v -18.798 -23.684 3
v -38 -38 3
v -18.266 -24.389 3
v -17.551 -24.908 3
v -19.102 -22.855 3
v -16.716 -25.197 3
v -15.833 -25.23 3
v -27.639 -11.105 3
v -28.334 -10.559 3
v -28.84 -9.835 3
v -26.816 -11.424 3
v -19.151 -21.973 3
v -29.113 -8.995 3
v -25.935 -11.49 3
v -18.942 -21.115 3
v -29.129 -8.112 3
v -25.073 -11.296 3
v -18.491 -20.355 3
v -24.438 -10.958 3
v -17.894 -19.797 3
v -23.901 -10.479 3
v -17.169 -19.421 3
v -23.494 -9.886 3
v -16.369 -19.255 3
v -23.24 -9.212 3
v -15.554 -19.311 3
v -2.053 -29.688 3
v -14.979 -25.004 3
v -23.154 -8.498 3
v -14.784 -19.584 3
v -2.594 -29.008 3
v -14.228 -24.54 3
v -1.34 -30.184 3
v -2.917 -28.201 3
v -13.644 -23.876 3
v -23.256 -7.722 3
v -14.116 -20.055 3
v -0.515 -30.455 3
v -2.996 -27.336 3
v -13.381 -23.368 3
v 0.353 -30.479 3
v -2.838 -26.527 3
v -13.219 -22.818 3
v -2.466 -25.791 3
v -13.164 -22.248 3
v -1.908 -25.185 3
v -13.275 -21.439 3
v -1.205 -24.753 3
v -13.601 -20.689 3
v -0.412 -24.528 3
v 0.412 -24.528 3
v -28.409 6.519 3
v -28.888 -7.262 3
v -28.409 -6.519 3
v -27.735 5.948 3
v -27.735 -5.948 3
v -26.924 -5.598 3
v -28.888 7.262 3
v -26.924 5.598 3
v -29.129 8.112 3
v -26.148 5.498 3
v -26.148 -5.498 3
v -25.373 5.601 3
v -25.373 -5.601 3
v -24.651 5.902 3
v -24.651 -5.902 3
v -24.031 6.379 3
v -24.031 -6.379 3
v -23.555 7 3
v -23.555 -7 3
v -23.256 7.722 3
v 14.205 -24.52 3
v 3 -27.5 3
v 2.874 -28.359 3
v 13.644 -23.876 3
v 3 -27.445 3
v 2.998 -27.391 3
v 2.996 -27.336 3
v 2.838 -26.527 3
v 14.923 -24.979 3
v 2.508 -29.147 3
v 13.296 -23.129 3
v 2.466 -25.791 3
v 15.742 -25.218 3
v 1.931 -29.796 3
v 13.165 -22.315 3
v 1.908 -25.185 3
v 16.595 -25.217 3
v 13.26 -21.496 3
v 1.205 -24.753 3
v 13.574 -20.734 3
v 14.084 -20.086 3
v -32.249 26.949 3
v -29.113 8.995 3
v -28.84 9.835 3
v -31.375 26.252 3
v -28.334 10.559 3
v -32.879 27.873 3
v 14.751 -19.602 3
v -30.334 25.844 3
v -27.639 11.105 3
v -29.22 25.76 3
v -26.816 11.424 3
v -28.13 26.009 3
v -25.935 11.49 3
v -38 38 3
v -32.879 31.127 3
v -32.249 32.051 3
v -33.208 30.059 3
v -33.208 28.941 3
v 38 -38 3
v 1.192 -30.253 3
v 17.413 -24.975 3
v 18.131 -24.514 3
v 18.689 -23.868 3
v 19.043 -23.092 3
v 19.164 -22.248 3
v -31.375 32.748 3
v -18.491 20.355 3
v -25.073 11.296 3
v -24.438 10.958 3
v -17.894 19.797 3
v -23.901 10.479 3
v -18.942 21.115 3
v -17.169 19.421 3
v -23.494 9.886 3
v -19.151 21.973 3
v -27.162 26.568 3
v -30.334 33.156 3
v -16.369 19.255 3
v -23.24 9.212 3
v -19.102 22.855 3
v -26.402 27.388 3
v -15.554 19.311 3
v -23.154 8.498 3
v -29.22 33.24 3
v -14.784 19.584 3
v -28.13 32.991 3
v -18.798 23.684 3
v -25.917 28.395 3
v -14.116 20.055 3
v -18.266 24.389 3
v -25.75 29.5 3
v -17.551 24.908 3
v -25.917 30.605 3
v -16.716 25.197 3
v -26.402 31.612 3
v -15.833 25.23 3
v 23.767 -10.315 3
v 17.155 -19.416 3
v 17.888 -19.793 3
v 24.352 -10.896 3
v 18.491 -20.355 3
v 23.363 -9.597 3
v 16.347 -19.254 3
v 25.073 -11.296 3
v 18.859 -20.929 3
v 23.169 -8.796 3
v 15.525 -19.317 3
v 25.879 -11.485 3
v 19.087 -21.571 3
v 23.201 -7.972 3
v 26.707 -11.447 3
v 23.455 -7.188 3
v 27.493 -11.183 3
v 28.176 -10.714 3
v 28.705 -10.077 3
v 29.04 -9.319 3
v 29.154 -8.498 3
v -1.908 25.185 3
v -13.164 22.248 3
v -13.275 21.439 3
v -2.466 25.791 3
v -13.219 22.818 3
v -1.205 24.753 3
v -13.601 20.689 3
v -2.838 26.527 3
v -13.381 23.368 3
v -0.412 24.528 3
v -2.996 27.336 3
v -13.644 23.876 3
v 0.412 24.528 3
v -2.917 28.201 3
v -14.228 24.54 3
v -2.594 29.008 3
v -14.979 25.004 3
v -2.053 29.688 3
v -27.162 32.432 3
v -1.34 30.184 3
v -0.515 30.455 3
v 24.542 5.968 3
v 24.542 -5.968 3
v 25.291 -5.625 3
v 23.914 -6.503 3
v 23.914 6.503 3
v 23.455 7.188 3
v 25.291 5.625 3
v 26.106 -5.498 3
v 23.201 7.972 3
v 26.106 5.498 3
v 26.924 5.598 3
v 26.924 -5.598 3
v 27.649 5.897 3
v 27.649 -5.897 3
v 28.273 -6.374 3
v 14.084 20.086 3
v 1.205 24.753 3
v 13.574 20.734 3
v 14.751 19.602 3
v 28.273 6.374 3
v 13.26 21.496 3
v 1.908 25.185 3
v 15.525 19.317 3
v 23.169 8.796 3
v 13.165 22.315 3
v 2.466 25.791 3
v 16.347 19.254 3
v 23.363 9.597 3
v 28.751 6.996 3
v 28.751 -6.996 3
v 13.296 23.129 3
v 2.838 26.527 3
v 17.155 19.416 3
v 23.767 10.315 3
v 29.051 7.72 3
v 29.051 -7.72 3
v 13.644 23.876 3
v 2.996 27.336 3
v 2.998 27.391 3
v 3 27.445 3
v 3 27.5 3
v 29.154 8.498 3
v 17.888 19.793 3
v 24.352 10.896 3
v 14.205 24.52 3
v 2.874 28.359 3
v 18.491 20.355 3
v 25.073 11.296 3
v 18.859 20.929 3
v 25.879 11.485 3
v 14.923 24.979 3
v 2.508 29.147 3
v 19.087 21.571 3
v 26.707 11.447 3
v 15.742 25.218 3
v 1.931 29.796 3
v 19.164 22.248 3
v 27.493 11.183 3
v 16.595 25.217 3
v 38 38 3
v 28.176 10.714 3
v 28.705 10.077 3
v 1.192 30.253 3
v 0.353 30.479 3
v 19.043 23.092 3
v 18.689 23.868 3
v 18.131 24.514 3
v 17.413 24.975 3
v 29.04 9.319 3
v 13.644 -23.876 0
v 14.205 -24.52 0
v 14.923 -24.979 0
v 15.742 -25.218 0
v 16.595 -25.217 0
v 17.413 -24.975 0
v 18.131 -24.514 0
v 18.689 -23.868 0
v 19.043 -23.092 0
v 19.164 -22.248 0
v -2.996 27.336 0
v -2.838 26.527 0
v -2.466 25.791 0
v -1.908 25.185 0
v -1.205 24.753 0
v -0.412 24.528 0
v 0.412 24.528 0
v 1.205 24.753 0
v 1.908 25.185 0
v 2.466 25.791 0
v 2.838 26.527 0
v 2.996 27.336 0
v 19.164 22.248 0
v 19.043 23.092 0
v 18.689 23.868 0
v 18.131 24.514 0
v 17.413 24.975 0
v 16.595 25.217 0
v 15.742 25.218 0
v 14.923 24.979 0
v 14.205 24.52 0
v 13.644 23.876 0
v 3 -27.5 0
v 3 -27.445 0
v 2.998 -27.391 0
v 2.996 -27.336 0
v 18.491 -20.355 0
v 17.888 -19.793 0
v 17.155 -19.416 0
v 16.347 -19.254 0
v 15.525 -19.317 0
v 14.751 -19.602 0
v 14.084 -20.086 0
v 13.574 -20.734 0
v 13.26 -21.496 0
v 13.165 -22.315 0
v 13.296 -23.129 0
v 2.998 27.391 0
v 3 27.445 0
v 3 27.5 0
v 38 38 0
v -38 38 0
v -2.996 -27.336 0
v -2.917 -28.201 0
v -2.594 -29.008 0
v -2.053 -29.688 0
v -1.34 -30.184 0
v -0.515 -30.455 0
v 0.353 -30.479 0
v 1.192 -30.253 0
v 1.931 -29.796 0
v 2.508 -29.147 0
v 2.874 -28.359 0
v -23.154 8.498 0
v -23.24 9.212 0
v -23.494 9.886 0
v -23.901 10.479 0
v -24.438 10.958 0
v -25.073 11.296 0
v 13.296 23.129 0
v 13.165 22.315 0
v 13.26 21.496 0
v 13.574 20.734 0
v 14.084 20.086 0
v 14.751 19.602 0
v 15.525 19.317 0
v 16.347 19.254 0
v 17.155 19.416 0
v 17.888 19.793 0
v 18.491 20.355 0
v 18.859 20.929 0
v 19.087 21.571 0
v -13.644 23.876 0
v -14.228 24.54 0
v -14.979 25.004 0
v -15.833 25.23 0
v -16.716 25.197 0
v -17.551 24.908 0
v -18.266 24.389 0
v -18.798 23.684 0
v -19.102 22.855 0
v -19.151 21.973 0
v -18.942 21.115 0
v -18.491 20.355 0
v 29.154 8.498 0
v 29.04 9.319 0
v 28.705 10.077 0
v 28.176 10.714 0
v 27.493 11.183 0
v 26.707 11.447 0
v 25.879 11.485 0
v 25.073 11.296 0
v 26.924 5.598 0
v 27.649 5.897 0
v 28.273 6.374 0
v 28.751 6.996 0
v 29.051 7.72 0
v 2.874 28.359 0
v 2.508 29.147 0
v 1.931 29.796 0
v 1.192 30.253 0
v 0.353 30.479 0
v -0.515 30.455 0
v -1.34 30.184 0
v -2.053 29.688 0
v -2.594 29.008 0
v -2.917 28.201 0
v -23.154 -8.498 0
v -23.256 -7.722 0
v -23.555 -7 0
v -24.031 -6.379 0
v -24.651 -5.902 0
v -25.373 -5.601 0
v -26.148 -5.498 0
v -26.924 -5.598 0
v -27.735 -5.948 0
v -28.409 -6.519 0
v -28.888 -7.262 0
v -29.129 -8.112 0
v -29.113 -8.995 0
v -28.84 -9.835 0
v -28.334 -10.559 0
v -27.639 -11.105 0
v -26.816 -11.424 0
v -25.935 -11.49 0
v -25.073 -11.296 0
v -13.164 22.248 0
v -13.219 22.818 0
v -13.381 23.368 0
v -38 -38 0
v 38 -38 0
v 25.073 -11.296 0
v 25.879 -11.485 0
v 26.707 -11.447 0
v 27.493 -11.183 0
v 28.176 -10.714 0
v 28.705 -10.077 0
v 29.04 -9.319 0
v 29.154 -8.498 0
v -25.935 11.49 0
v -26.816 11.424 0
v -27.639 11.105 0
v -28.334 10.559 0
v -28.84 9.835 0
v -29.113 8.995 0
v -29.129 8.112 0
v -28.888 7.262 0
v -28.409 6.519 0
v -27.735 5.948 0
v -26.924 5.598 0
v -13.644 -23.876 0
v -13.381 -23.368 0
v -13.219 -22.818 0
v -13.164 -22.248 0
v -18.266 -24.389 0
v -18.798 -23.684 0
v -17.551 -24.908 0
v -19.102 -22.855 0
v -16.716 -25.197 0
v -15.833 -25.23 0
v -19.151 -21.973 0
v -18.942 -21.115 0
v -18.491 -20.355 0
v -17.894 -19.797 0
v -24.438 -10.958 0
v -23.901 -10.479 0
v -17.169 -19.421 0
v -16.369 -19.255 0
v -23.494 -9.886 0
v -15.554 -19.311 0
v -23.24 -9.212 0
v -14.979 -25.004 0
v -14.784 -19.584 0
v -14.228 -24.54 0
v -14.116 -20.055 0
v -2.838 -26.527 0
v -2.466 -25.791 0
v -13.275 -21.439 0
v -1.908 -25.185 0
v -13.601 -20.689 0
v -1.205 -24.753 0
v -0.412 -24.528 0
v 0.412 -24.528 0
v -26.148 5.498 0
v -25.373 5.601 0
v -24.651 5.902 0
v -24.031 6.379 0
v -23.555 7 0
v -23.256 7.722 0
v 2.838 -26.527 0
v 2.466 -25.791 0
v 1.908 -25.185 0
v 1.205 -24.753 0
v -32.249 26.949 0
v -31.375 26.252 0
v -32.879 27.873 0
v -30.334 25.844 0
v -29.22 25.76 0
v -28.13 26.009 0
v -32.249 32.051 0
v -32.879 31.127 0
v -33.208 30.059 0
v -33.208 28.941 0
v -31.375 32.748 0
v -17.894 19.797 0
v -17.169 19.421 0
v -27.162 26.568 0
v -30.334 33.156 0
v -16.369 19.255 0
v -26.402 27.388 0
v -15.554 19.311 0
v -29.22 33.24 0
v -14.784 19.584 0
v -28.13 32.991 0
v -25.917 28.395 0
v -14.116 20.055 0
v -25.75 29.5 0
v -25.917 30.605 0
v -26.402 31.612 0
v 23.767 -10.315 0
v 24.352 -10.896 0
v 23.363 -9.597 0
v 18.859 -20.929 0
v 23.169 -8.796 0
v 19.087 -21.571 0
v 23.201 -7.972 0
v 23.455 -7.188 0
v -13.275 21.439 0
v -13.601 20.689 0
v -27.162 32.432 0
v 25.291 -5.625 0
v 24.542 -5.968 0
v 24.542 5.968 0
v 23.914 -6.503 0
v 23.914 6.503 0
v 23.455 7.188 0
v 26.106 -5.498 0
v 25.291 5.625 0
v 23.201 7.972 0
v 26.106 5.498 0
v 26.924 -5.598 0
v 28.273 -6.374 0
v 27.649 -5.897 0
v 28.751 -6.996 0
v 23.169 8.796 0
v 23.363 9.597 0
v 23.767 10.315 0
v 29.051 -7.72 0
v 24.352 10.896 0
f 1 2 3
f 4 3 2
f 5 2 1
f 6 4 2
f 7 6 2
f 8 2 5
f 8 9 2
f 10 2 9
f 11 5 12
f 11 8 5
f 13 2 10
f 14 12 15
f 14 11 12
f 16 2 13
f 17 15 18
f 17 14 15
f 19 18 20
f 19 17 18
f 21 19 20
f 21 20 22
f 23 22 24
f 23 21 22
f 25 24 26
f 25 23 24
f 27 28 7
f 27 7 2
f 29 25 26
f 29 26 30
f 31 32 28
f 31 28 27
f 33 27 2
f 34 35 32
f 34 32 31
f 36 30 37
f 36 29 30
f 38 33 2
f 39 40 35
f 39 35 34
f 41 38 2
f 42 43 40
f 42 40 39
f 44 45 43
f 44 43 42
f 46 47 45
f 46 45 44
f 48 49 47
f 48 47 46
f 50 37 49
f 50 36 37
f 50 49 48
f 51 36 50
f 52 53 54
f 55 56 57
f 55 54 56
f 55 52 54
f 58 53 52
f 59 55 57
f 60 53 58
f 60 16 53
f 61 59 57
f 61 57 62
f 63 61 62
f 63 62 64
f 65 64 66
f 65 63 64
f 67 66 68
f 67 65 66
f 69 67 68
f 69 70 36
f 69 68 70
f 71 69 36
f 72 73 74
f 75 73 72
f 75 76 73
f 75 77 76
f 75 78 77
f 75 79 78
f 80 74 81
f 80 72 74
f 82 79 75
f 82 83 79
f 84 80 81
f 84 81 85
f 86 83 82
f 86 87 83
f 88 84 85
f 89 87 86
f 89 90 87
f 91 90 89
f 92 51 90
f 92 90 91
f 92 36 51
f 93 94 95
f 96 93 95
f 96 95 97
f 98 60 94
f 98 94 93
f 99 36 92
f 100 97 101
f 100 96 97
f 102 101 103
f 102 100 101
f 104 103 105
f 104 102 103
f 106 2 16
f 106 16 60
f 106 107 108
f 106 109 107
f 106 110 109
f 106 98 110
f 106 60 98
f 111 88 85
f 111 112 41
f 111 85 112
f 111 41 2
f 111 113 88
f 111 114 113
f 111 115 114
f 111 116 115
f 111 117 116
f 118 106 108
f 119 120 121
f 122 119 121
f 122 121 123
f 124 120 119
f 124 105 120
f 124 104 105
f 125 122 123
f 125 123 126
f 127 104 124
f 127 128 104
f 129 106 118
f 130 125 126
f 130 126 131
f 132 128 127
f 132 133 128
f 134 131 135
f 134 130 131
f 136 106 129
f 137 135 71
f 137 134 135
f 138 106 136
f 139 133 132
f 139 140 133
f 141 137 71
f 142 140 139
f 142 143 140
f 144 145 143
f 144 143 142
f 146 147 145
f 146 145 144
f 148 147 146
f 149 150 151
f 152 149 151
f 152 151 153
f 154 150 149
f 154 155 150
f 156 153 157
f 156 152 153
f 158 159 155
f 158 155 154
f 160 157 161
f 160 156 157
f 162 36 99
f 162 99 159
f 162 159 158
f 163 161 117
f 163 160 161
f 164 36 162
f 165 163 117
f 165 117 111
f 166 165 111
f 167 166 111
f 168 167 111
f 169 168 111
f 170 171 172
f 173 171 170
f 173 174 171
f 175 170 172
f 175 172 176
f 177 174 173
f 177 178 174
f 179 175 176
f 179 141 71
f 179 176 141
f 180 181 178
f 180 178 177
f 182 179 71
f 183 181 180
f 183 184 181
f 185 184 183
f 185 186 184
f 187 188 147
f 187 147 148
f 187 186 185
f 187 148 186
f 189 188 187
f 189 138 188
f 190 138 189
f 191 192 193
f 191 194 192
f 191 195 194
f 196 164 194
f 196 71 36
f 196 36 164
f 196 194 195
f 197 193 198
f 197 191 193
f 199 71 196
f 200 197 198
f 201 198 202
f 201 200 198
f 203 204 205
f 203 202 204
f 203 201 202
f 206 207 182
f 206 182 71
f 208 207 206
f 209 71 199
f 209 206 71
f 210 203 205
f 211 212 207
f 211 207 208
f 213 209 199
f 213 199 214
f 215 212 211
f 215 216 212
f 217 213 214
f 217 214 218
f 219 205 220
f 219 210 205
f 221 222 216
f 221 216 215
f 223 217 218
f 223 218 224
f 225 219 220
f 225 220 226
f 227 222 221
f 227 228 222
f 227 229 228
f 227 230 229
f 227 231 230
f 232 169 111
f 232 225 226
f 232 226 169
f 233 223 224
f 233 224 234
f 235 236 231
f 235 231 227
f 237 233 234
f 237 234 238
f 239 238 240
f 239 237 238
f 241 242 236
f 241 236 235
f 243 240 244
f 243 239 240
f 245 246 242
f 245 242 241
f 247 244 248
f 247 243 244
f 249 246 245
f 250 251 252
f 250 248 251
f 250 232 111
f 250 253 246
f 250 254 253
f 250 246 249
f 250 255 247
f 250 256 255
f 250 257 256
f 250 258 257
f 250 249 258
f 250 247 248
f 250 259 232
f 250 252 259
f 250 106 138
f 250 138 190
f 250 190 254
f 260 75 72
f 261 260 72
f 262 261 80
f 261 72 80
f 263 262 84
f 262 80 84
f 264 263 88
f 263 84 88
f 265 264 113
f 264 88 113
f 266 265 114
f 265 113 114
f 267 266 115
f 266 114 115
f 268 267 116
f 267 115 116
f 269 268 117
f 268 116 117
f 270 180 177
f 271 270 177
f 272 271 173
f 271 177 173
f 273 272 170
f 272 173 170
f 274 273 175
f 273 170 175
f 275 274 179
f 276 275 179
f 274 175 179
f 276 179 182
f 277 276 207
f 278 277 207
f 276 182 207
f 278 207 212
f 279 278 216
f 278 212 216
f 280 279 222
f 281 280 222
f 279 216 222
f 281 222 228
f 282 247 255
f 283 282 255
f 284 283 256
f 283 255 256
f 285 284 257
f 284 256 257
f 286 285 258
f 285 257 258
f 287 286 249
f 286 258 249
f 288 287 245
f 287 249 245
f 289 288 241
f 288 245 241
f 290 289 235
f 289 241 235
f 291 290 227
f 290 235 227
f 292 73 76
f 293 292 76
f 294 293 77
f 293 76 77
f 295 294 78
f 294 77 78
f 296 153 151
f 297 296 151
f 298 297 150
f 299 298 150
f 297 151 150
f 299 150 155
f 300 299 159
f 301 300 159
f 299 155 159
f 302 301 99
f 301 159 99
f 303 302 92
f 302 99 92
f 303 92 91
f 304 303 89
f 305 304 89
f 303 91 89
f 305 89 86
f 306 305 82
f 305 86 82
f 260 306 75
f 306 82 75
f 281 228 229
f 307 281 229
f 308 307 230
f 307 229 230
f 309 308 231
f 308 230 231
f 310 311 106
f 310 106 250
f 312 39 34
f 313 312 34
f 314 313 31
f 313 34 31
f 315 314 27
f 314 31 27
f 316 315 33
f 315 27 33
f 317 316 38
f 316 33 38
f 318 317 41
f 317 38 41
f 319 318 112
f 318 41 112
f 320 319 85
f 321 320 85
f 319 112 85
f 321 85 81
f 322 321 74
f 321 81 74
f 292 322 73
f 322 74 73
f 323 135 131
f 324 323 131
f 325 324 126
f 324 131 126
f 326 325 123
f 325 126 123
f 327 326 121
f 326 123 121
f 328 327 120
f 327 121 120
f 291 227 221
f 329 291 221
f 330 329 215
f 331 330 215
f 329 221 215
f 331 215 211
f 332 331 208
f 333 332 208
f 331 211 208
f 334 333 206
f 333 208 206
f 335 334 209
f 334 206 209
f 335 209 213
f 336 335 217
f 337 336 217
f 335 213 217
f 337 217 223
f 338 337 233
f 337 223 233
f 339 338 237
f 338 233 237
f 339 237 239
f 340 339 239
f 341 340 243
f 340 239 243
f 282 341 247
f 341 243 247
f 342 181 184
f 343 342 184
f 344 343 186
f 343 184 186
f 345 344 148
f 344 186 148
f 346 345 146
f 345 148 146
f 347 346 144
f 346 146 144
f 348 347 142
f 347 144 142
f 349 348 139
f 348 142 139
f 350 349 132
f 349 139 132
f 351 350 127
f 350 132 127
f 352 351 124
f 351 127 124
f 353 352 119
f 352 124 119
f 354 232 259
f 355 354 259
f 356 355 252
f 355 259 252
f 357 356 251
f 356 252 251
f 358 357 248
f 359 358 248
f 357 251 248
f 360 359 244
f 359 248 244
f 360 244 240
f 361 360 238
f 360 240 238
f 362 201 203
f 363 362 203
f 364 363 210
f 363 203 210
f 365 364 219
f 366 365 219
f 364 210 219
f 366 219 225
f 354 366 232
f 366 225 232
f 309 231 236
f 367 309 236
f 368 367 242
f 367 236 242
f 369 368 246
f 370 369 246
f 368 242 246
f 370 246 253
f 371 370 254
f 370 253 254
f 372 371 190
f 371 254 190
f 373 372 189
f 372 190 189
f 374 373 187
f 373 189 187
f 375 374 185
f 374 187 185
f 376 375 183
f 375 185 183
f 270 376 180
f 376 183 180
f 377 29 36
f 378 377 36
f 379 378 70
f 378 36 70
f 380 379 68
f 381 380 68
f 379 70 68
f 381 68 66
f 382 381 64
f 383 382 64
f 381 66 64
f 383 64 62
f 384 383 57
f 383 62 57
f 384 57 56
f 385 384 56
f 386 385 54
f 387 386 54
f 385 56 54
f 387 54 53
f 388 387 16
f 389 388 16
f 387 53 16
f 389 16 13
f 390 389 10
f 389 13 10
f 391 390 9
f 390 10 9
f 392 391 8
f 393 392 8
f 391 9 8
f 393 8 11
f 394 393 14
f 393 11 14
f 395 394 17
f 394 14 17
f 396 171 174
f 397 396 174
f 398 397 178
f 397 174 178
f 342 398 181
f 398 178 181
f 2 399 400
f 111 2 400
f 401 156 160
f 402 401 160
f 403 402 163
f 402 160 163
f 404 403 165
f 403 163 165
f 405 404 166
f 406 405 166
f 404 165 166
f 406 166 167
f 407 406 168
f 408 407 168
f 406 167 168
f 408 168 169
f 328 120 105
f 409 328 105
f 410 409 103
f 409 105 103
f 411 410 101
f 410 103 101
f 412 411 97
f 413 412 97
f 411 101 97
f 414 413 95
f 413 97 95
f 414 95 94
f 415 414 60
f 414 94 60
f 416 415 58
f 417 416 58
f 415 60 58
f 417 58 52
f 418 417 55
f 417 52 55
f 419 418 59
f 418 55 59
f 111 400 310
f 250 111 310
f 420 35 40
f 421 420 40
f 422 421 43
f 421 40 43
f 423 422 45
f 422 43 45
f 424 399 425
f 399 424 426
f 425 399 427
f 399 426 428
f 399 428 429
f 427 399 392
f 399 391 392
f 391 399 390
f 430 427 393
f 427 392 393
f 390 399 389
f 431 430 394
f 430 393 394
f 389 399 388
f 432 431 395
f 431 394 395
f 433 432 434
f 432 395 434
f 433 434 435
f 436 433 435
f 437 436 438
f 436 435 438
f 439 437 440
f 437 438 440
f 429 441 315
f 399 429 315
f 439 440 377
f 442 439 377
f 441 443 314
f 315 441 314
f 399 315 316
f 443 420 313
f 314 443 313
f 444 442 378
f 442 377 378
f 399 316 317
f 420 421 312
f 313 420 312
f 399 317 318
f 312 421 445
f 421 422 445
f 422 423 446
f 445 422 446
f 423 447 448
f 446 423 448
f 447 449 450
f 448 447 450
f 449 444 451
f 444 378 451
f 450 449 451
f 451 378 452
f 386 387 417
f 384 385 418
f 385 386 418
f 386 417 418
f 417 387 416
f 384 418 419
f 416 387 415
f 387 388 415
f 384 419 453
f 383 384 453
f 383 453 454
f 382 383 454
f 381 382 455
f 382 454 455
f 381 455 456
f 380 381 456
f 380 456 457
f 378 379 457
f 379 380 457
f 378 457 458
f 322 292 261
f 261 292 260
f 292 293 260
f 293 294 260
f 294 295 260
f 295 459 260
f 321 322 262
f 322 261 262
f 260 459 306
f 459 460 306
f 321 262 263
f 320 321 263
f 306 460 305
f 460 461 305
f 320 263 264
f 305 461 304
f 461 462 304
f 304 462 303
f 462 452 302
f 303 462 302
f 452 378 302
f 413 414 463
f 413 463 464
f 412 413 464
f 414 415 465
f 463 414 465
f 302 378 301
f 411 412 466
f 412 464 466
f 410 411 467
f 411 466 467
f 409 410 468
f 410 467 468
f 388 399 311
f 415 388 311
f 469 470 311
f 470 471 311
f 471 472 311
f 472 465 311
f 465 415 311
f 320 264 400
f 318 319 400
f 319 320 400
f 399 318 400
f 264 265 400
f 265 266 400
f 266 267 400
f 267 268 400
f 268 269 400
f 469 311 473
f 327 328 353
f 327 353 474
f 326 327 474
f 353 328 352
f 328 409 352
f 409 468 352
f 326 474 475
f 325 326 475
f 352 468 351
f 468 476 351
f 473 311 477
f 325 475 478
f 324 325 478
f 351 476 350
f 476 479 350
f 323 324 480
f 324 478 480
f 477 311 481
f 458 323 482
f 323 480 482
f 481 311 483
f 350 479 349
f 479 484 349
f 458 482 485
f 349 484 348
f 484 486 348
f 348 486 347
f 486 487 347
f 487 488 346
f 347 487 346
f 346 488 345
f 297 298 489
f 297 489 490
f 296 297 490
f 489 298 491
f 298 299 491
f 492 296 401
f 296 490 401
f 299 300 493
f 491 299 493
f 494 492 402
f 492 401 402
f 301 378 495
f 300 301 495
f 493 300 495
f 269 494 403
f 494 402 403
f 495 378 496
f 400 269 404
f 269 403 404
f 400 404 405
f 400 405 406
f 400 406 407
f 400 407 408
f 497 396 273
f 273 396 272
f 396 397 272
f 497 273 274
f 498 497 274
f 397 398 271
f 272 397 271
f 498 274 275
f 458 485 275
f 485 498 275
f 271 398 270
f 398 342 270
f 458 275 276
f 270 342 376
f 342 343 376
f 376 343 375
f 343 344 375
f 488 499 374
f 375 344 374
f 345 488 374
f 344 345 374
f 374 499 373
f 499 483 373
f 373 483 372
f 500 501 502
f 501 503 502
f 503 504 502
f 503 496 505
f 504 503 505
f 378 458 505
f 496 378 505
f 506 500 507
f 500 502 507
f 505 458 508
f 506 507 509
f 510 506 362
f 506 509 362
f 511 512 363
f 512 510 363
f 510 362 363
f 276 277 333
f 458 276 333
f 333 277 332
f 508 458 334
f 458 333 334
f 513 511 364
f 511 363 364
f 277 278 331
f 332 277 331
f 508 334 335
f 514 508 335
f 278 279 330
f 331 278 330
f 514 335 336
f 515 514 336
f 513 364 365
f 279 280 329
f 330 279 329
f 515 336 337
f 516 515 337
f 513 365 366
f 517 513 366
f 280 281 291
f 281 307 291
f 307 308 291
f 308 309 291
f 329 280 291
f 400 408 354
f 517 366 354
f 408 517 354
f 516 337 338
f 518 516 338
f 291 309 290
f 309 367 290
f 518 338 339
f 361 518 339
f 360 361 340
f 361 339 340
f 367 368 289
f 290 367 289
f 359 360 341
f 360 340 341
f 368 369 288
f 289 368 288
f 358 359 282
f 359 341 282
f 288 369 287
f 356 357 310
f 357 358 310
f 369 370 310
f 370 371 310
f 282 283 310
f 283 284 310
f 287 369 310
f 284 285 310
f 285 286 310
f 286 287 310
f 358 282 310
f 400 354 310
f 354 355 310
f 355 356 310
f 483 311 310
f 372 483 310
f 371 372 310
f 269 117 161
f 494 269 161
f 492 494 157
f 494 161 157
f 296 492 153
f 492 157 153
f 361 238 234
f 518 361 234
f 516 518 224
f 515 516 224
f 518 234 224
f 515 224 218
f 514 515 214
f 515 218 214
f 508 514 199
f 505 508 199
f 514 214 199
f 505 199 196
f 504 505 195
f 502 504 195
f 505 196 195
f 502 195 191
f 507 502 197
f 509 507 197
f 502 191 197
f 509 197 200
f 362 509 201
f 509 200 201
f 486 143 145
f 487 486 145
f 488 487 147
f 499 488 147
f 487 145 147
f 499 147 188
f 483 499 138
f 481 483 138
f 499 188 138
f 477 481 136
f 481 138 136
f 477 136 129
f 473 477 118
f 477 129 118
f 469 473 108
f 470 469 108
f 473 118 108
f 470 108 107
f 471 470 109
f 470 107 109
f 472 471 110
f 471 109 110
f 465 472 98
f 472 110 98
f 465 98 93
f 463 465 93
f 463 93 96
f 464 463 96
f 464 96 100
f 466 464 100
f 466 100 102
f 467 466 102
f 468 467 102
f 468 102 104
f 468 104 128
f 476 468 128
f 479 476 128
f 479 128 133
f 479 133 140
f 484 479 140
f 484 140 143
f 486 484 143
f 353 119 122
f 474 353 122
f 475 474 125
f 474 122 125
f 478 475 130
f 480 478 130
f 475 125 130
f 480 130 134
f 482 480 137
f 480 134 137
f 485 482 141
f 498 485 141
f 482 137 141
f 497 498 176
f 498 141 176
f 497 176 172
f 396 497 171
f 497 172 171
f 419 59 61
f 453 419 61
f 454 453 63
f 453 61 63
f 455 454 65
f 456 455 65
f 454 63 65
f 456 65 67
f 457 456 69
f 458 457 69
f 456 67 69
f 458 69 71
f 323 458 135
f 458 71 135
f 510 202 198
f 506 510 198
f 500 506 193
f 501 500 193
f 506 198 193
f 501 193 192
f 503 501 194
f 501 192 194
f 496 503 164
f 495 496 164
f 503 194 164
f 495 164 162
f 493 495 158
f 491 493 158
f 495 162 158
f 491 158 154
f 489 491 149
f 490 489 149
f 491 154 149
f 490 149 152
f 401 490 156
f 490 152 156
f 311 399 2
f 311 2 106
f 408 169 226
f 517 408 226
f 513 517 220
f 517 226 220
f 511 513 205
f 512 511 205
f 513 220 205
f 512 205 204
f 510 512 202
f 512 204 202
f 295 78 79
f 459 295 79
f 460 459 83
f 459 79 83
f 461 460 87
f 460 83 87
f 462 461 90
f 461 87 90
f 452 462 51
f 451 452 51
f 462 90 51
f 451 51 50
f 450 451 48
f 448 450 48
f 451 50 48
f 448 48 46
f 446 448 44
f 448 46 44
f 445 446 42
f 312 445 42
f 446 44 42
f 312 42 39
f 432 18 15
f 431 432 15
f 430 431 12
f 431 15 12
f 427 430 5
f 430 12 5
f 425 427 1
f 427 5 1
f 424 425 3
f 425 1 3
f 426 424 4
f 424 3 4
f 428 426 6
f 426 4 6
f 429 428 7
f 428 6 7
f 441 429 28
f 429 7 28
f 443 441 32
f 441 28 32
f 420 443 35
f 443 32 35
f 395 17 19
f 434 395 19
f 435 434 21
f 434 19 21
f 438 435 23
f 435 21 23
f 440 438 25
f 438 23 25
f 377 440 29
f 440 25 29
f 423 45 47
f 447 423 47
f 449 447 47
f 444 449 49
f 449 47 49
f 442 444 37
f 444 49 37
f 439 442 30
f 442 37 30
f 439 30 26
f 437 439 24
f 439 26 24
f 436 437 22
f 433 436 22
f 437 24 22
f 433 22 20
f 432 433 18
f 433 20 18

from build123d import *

# Parameters (mm, degrees)
F0_W     = 76
F0_H     = 76
F1_DEPTH = 3
F3_DEPTH = 25
F4_R     = 3.75
F5_DEPTH = 25


with BuildPart() as f1:
    # F0 (on Top) → F1 (new body)
    with BuildSketch(Plane.XY):
        Rectangle(F0_W, F0_H)
    extrude(amount=F1_DEPTH)

    # F2 (on face) → F3 (cut)
    with BuildSketch(Plane.XY.offset(3)):
        with BuildLine():
            ThreePointArc((25.0727558965, 11.2963229308), (23.3008846492, 7.5709163622), (26.9240976399, 5.5984789253))
            ThreePointArc((26.9240976399, 5.5984789253), (26.1540541981, 8.4979673453), (25.0727558965, 11.2963229308))
        make_face()
        with BuildLine():
            ThreePointArc((25.0727558965, 11.2963229308), (26.1540541981, 8.4979673453), (26.9240976399, 5.5984789253))
            ThreePointArc((26.9240976399, 5.5984789253), (28.5320922892, 6.669051044), (29.1540541981, 8.4979673453))
            ThreePointArc((29.1540541981, 8.4979673453), (27.8505366022, 10.9722242949), (25.0727558965, 11.2963229308))
        make_face()
        with BuildLine():
            ThreePointArc((29.1540541981, -8.4979673453), (28.5320922892, -6.669051044), (26.9240976399, -5.5984789253))
            ThreePointArc((26.9240976399, -5.5984789253), (26.1540541981, -8.4979673453), (25.0727558965, -11.2963229308))
            ThreePointArc((25.0727558965, -11.2963229308), (27.8505366022, -10.9722242949), (29.1540541981, -8.4979673453))
        make_face()
        with BuildLine():
            ThreePointArc((25.0727558965, -11.2963229308), (26.1540541981, -8.4979673453), (26.9240976399, -5.5984789253))
            ThreePointArc((26.9240976399, -5.5984789253), (23.3008846492, -7.5709163622), (25.0727558965, -11.2963229308))
        make_face()
        with BuildLine():
            ThreePointArc((13.6444735922, 23.8763133752), (14.4007386812, 19.8209163622), (18.4913492013, 20.3548521172))
            ThreePointArc((18.4913492013, 20.3548521172), (16.164094438, 22.2479673453), (13.6444735922, 23.8763133752))
        make_face()
        with BuildLine():
            ThreePointArc((13.6444735922, 23.8763133752), (16.164094438, 22.2479673453), (18.4913492013, 20.3548521172))
            ThreePointArc((18.4913492013, 20.3548521172), (18.990909279, 21.2434187626), (19.164094438, 22.2479673453))
            ThreePointArc((19.164094438, 22.2479673453), (17.0129576374, 25.1253674337), (13.6444735922, 23.8763133752))
        make_face()
        with BuildLine():
            ThreePointArc((19.164094438, -22.2479673453), (18.990909279, -21.2434187626), (18.4913492013, -20.3548521172))
            ThreePointArc((18.4913492013, -20.3548521172), (16.164094438, -22.2479673453), (13.6444735922, -23.8763133752))
            ThreePointArc((13.6444735922, -23.8763133752), (17.0129576374, -25.1253674337), (19.164094438, -22.2479673453))
        make_face()
        with BuildLine():
            ThreePointArc((13.6444735922, -23.8763133752), (16.164094438, -22.2479673453), (18.4913492013, -20.3548521172))
            ThreePointArc((18.4913492013, -20.3548521172), (14.4007386812, -19.8209163622), (13.6444735922, -23.8763133752))
        make_face()
        with BuildLine():
            ThreePointArc((-2.9955338657, 27.3363636364), (0, 24.5), (2.9955338657, 27.3363636364))
            ThreePointArc((2.9955338657, 27.3363636364), (0, 27.5), (-2.9955338657, 27.3363636364))
        make_face()
        with BuildLine():
            ThreePointArc((-2.9955338657, 27.3363636364), (0, 27.5), (2.9955338657, 27.3363636364))
            ThreePointArc((2.9955338657, 27.3363636364), (2.9988832586, 27.4181513503), (3, 27.5))
            ThreePointArc((3, 27.5), (-0.0818486497, 30.4988832586), (-2.9955338657, 27.3363636364))
        make_face()
        with BuildLine():
            ThreePointArc((3, -27.5), (2.9988832586, -27.4181513503), (2.9955338657, -27.3363636364))
            ThreePointArc((2.9955338657, -27.3363636364), (0, -27.5), (-2.9955338657, -27.3363636364))
            ThreePointArc((-2.9955338657, -27.3363636364), (-0.0818486497, -30.4988832586), (3, -27.5))
        make_face()
        with BuildLine():
            ThreePointArc((-2.9955338657, -27.3363636364), (0, -27.5), (2.9955338657, -27.3363636364))
            ThreePointArc((2.9955338657, -27.3363636364), (0, -24.5), (-2.9955338657, -27.3363636364))
        make_face()
        with BuildLine():
            ThreePointArc((-13.164094438, 22.2479673453), (-13.2866943496, 23.0968305447), (-13.6444735922, 23.8763133752))
            ThreePointArc((-13.6444735922, 23.8763133752), (-16.164094438, 22.2479673453), (-18.4913492013, 20.3548521172))
            ThreePointArc((-18.4913492013, 20.3548521172), (-15.1595458553, 19.4211525044), (-13.164094438, 22.2479673453))
        make_face()
        with BuildLine():
            ThreePointArc((-18.4913492013, 20.3548521172), (-16.164094438, 22.2479673453), (-13.6444735922, 23.8763133752))
            ThreePointArc((-13.6444735922, 23.8763133752), (-17.9274501949, 24.6750183284), (-18.4913492013, 20.3548521172))
        make_face()
        with BuildLine():
            ThreePointArc((-18.4913492013, -20.3548521172), (-17.9274501949, -24.6750183284), (-13.6444735922, -23.8763133752))
            ThreePointArc((-13.6444735922, -23.8763133752), (-16.164094438, -22.2479673453), (-18.4913492013, -20.3548521172))
        make_face()
        with BuildLine():
            ThreePointArc((-18.4913492013, -20.3548521172), (-16.164094438, -22.2479673453), (-13.6444735922, -23.8763133752))
            ThreePointArc((-13.6444735922, -23.8763133752), (-13.2866943496, -23.0968305447), (-13.164094438, -22.2479673453))
            ThreePointArc((-13.164094438, -22.2479673453), (-15.1595458553, -19.4211525044), (-18.4913492013, -20.3548521172))
        make_face()
        with BuildLine():
            ThreePointArc((-23.1540541981, 8.4979673453), (-23.6797972485, 10.1944497494), (-25.0727558965, 11.2963229308))
            ThreePointArc((-25.0727558965, 11.2963229308), (-26.1540541981, 8.4979673453), (-26.9240976399, 5.5984789253))
            ThreePointArc((-26.9240976399, 5.5984789253), (-24.3251378968, 6.1199292542), (-23.1540541981, 8.4979673453))
        make_face()
        with BuildLine():
            ThreePointArc((-26.9240976399, 5.5984789253), (-26.1540541981, 8.4979673453), (-25.0727558965, 11.2963229308))
            ThreePointArc((-25.0727558965, 11.2963229308), (-29.007223747, 9.4250183284), (-26.9240976399, 5.5984789253))
        make_face()
        with BuildLine():
            ThreePointArc((-26.9240976399, -5.5984789253), (-29.007223747, -9.4250183284), (-25.0727558965, -11.2963229308))
            ThreePointArc((-25.0727558965, -11.2963229308), (-26.1540541981, -8.4979673453), (-26.9240976399, -5.5984789253))
        make_face()
        with BuildLine():
            ThreePointArc((-26.9240976399, -5.5984789253), (-26.1540541981, -8.4979673453), (-25.0727558965, -11.2963229308))
            ThreePointArc((-25.0727558965, -11.2963229308), (-23.6797972485, -10.1944497494), (-23.1540541981, -8.4979673453))
            ThreePointArc((-23.1540541981, -8.4979673453), (-24.3251378968, -6.1199292542), (-26.9240976399, -5.5984789253))
        make_face()
    extrude(amount=-F3_DEPTH, mode=Mode.SUBTRACT)

    # F4 (on face) → F5 (cut)
    with BuildSketch(Plane.XY.offset(3)):
        with Locations((-29.5, 29.5)):
            Circle(F4_R)
    extrude(amount=-F5_DEPTH, mode=Mode.SUBTRACT)


solid = f1.part
